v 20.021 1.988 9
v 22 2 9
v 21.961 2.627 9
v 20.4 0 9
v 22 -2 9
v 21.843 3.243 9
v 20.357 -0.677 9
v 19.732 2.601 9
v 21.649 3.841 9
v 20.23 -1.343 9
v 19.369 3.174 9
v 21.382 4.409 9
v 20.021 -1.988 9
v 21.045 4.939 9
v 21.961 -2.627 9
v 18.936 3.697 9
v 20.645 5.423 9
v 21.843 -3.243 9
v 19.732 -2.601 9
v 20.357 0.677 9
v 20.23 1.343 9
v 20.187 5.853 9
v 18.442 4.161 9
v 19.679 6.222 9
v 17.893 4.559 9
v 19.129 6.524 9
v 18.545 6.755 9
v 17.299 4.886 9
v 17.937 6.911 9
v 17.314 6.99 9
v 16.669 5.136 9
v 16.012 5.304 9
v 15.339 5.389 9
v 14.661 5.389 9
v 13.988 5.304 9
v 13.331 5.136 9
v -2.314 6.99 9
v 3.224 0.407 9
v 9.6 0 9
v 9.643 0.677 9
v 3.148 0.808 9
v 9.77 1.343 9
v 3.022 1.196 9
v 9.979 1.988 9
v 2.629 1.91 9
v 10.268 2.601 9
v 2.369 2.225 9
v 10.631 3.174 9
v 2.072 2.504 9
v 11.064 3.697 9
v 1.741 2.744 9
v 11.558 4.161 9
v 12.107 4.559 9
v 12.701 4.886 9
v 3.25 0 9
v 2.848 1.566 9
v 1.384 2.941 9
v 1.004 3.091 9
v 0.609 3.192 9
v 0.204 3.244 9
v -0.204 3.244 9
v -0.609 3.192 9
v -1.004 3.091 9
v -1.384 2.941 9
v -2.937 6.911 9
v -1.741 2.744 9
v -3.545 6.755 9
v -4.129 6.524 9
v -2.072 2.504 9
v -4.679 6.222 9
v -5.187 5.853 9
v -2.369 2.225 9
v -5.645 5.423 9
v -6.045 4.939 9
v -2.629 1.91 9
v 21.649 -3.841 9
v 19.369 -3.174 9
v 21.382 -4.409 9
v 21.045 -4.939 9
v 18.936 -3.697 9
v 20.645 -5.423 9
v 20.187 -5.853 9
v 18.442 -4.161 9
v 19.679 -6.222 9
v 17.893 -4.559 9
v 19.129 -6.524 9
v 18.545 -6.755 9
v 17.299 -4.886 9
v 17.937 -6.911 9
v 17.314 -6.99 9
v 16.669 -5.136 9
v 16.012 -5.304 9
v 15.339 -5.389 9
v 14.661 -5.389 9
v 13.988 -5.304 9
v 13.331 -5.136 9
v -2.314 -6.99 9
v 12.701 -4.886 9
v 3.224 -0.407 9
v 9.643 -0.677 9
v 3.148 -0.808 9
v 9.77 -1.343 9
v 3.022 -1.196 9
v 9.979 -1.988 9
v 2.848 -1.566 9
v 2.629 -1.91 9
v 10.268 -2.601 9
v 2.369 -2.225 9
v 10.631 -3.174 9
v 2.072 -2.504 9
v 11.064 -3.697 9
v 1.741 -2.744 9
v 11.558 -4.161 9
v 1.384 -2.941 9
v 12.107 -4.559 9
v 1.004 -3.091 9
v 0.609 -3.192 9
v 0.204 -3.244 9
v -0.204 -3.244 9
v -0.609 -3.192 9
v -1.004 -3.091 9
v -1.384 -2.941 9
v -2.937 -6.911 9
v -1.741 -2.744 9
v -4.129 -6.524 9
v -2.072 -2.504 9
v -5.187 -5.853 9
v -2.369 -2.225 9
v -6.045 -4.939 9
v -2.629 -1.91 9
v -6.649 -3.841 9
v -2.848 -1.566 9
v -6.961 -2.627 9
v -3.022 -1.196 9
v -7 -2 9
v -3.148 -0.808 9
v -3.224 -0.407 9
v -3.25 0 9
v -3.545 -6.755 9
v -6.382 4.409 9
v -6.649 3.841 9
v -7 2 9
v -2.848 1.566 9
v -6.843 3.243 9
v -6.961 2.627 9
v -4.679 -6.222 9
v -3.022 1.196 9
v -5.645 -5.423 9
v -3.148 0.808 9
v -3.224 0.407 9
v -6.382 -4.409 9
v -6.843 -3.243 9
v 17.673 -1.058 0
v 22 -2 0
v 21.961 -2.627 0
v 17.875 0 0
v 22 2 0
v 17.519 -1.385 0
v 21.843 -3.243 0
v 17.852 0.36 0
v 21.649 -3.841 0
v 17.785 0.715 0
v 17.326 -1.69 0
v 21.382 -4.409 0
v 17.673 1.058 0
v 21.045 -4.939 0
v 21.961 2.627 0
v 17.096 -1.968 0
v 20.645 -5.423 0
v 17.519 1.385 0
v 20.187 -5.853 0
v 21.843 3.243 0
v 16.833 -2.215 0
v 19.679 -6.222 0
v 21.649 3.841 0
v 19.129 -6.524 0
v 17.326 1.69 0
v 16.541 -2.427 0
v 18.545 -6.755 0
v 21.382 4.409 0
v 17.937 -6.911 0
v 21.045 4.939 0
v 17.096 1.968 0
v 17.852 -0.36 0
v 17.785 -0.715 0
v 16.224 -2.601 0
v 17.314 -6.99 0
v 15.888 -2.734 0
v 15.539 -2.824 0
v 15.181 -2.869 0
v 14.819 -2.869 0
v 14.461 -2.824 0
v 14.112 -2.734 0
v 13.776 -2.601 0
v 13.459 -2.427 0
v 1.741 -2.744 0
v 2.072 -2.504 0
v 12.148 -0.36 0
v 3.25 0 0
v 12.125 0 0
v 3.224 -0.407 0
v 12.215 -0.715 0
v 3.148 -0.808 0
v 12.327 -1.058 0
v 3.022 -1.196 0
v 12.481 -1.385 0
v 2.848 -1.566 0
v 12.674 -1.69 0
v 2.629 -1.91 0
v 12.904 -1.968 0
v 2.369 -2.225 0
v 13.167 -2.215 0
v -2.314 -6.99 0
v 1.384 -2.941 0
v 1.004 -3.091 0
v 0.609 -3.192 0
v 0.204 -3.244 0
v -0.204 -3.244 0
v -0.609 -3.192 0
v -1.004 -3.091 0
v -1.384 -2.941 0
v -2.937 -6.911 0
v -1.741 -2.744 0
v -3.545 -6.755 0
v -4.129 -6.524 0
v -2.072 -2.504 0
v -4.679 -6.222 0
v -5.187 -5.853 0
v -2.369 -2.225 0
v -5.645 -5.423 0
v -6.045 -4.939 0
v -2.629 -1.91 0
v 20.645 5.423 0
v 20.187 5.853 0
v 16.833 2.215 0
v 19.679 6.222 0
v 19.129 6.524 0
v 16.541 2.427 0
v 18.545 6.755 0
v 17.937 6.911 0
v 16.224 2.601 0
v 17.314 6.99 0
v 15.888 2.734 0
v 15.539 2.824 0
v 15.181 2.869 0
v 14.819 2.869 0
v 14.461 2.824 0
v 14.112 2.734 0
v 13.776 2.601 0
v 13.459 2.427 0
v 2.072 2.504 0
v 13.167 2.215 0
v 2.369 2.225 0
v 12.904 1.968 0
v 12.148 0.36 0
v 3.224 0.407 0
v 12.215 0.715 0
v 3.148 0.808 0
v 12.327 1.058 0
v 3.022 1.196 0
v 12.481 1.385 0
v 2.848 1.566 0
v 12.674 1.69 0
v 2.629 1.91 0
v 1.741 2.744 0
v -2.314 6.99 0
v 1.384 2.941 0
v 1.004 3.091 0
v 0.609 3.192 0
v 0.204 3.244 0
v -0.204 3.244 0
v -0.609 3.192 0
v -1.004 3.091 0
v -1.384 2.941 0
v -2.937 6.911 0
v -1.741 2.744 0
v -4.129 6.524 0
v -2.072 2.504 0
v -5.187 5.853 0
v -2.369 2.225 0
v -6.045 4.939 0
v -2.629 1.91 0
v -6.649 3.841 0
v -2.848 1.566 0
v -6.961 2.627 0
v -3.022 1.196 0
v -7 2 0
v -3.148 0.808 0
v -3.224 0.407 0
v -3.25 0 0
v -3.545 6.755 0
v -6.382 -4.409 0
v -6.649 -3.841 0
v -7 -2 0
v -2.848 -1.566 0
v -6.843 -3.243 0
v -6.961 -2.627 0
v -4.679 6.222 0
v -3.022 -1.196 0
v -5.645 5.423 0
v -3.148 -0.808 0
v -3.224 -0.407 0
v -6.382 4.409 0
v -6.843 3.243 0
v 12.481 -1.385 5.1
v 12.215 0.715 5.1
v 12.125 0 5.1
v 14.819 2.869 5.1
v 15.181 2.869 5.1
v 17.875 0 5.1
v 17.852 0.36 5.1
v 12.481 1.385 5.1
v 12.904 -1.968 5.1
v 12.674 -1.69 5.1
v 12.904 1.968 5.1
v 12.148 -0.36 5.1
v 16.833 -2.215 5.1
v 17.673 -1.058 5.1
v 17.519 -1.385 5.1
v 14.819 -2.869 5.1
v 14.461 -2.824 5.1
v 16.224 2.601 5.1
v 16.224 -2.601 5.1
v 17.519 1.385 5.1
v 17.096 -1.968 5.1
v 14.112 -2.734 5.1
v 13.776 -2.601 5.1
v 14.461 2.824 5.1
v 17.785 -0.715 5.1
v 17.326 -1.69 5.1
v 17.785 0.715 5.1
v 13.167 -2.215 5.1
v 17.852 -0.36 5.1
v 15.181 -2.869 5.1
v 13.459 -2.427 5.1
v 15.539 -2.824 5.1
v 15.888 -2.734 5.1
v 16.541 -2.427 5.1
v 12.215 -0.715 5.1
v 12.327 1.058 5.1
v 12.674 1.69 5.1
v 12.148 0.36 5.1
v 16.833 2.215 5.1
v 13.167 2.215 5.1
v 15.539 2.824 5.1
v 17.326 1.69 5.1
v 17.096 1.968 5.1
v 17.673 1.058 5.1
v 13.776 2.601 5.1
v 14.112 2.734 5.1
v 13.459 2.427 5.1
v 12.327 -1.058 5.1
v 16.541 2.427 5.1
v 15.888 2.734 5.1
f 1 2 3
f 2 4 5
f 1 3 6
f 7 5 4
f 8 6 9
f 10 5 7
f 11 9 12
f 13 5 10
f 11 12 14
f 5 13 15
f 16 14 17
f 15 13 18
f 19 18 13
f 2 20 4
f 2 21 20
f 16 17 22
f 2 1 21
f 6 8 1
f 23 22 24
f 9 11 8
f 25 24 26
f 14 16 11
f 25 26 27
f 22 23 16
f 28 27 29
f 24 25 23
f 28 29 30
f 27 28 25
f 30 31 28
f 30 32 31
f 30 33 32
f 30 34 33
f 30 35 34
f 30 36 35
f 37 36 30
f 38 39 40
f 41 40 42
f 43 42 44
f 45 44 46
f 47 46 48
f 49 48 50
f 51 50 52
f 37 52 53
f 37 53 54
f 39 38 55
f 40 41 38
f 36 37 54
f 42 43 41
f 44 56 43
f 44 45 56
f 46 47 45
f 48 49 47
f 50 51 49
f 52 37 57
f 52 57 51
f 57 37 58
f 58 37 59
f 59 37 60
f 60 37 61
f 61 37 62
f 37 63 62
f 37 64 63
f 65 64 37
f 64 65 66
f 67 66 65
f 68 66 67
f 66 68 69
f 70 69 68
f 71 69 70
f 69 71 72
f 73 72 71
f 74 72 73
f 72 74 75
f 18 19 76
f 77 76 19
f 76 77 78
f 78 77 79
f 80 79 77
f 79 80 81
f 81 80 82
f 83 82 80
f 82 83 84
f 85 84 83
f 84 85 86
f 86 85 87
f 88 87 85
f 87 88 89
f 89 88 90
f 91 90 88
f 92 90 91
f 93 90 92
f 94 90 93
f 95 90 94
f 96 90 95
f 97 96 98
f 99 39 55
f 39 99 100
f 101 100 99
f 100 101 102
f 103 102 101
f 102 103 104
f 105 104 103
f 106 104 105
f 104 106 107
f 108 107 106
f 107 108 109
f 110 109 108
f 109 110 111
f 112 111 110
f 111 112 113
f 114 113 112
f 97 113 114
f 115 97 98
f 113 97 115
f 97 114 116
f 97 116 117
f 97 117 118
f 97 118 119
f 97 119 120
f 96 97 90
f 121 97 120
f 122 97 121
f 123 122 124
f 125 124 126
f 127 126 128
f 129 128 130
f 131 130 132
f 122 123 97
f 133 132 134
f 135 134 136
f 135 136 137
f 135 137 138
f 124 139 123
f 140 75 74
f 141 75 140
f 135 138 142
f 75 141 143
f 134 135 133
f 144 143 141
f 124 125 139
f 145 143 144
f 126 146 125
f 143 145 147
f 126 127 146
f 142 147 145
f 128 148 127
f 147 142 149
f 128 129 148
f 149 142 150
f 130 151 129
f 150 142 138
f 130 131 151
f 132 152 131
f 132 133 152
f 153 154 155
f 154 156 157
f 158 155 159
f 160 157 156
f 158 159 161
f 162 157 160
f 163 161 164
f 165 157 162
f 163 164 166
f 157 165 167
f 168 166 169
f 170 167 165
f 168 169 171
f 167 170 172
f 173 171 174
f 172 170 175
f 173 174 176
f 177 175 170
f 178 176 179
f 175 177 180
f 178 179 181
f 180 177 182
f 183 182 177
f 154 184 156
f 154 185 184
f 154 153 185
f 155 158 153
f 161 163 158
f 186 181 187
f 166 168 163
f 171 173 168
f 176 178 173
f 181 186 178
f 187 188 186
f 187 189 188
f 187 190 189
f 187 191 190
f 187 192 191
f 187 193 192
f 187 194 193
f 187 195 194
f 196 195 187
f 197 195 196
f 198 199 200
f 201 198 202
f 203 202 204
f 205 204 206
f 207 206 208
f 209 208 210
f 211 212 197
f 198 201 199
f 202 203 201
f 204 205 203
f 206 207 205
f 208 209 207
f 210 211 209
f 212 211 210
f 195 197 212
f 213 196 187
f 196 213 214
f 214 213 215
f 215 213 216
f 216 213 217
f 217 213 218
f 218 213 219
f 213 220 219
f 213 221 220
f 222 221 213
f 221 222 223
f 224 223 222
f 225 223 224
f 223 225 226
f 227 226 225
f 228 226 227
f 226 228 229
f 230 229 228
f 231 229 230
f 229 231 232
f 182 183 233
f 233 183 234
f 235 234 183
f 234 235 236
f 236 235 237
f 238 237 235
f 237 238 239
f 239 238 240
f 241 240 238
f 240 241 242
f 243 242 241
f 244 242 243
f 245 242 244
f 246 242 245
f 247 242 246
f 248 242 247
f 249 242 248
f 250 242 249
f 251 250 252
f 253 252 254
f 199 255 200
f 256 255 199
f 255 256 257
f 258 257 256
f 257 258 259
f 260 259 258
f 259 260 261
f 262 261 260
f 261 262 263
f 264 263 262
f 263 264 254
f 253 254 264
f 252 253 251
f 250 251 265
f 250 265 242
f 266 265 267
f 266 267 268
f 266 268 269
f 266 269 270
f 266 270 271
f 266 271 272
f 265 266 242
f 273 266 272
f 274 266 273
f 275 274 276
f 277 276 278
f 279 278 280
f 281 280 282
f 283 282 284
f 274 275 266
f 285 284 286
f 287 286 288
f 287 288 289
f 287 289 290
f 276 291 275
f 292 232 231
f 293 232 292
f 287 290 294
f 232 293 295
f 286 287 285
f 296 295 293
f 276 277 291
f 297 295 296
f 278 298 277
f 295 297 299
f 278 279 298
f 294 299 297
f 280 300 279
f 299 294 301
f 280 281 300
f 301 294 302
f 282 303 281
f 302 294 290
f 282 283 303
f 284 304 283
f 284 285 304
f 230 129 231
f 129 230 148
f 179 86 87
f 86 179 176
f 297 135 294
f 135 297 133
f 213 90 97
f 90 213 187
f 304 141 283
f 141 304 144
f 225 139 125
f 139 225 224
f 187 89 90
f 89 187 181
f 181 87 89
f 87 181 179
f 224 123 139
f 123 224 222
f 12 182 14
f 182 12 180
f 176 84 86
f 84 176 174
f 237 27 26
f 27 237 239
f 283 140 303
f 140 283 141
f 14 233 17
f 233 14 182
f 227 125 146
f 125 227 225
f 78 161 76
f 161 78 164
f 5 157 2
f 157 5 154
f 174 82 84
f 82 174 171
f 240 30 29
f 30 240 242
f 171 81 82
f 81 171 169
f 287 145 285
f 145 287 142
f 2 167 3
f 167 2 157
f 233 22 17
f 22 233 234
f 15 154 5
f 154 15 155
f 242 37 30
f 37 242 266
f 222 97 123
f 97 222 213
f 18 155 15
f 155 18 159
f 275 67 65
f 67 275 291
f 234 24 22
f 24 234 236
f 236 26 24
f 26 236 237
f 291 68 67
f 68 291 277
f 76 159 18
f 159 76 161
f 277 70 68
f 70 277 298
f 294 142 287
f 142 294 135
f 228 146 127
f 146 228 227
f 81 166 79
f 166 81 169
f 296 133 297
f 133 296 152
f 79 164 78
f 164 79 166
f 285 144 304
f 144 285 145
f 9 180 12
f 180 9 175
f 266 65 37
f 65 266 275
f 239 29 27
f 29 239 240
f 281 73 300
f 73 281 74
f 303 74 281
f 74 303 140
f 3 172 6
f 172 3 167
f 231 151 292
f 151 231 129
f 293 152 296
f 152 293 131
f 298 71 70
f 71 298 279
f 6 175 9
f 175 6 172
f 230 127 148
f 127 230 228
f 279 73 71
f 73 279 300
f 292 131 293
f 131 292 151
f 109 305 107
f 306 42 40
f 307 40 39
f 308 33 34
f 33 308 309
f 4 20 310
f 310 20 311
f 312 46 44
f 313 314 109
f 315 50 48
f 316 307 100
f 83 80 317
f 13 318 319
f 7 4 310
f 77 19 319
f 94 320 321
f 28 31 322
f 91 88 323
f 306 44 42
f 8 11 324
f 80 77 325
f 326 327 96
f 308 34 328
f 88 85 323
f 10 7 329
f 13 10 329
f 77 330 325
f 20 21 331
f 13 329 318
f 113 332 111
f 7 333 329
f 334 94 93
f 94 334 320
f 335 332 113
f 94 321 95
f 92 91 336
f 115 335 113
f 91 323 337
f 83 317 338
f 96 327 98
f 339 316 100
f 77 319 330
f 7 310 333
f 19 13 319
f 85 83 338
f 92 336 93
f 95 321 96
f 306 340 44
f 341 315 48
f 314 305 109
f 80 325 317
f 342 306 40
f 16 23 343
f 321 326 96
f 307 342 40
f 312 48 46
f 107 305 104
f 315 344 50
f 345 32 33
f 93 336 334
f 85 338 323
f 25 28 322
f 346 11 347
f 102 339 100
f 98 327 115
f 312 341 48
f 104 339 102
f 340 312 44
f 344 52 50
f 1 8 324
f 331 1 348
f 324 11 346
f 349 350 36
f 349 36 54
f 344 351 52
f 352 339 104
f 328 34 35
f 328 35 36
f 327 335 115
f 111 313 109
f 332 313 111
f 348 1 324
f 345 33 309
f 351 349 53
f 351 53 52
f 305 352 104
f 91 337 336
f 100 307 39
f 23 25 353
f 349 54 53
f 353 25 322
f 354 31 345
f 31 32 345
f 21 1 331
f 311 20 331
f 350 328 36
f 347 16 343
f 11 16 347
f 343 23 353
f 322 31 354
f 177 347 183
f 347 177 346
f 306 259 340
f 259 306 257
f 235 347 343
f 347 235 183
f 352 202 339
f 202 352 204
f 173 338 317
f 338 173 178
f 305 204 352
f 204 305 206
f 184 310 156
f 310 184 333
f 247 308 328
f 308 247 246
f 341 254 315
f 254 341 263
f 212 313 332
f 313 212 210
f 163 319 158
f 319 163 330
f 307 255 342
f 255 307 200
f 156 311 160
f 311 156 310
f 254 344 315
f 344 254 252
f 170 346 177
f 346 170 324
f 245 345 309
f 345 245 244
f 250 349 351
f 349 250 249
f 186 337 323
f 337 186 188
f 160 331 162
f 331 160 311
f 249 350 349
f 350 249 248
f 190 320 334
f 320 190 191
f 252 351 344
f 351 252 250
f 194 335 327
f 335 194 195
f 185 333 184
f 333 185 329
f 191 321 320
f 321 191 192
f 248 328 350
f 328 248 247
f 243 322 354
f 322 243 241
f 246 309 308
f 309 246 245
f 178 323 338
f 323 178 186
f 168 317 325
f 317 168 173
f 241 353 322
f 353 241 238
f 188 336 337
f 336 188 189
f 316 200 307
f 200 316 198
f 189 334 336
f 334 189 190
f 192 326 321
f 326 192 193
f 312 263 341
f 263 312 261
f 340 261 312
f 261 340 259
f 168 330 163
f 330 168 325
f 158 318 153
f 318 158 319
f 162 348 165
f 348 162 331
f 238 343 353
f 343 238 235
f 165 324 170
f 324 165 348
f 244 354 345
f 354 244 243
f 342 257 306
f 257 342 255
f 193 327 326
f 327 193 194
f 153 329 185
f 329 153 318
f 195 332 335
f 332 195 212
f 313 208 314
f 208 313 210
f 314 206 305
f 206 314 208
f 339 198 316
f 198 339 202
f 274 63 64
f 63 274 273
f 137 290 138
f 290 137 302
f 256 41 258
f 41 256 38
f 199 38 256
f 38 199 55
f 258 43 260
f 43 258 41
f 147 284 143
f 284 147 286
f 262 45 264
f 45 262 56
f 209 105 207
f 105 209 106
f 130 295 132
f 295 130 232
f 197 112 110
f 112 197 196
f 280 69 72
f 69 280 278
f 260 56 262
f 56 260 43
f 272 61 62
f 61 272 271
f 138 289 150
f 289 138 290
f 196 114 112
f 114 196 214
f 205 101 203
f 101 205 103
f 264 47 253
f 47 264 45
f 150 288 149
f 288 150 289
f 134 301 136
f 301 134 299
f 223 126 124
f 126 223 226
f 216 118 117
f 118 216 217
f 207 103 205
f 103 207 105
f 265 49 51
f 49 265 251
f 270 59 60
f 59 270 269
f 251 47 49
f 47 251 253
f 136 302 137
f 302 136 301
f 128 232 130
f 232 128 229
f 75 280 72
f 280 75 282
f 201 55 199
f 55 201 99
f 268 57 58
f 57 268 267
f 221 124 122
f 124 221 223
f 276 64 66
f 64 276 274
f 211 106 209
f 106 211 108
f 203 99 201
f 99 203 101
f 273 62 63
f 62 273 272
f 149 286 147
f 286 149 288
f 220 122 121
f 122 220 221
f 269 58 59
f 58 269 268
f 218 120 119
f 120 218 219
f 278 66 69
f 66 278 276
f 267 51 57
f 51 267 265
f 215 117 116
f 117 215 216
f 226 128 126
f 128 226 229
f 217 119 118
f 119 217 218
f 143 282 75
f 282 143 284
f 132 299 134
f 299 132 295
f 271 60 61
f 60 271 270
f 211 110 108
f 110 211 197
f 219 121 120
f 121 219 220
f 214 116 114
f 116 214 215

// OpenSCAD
$fn = 50;


difference() {
	union() {
		cylinder(h = 9, r = 7.0000000000);
		translate(v = [7.5000000000, 0.0000000000, 0]) {
			hull() {
				translate(v = [-9.5000000000, 2.0000000000, 0]) {
					cylinder(h = 9, r = 5);
				}
				translate(v = [9.5000000000, 2.0000000000, 0]) {
					cylinder(h = 9, r = 5);
				}
				translate(v = [-9.5000000000, -2.0000000000, 0]) {
					cylinder(h = 9, r = 5);
				}
				translate(v = [9.5000000000, -2.0000000000, 0]) {
					cylinder(h = 9, r = 5);
				}
			}
		}
		translate(v = [7.5000000000, 0.0000000000, 0]) {
			hull() {
				translate(v = [-9.5000000000, 2.0000000000, 0]) {
					cylinder(h = 9, r = 5);
				}
				translate(v = [9.5000000000, 2.0000000000, 0]) {
					cylinder(h = 9, r = 5);
				}
				translate(v = [-9.5000000000, -2.0000000000, 0]) {
					cylinder(h = 9, r = 5);
				}
				translate(v = [9.5000000000, -2.0000000000, 0]) {
					cylinder(h = 9, r = 5);
				}
			}
		}
	}
	union() {
		translate(v = [15.0000000000, 0.0000000000, 9]) {
			rotate(a = [0, 0, 0]) {
				difference() {
					union() {
						#translate(v = [0, 0, -9.0000000000]) {
							cylinder(h = 9, r = 2.6000000000);
						}
						#translate(v = [0, 0, -3.9000000000]) {
							cylinder(h = 3.9000000000, r1 = 2.8750000000, r2 = 5.4000000000);
						}
						#translate(v = [0, 0, -9.0000000000]) {
							cylinder(h = 9, r = 2.8750000000);
						}
						#translate(v = [0, 0, -9.0000000000]) {
							cylinder(h = 9, r = 2.6000000000);
						}
					}
					union();
				}
			}
		}
		translate(v = [15.0000000000, 0.0000000000, 9]) {
			rotate(a = [0, 0, 0]) {
				difference() {
					union() {
						#translate(v = [0, 0, -9.0000000000]) {
							cylinder(h = 9, r = 2.6000000000);
						}
						#translate(v = [0, 0, -3.9000000000]) {
							cylinder(h = 3.9000000000, r1 = 2.8750000000, r2 = 5.4000000000);
						}
						#translate(v = [0, 0, -9.0000000000]) {
							cylinder(h = 9, r = 2.8750000000);
						}
						#translate(v = [0, 0, -9.0000000000]) {
							cylinder(h = 9, r = 2.6000000000);
						}
					}
					union();
				}
			}
		}
		translate(v = [0, 0, -100]) {
			cylinder(h = 200, r = 3.2500000000);
		}
		translate(v = [0, 0, -100]) {
			cylinder(h = 200, r = 1.8000000000);
		}
	}
}
